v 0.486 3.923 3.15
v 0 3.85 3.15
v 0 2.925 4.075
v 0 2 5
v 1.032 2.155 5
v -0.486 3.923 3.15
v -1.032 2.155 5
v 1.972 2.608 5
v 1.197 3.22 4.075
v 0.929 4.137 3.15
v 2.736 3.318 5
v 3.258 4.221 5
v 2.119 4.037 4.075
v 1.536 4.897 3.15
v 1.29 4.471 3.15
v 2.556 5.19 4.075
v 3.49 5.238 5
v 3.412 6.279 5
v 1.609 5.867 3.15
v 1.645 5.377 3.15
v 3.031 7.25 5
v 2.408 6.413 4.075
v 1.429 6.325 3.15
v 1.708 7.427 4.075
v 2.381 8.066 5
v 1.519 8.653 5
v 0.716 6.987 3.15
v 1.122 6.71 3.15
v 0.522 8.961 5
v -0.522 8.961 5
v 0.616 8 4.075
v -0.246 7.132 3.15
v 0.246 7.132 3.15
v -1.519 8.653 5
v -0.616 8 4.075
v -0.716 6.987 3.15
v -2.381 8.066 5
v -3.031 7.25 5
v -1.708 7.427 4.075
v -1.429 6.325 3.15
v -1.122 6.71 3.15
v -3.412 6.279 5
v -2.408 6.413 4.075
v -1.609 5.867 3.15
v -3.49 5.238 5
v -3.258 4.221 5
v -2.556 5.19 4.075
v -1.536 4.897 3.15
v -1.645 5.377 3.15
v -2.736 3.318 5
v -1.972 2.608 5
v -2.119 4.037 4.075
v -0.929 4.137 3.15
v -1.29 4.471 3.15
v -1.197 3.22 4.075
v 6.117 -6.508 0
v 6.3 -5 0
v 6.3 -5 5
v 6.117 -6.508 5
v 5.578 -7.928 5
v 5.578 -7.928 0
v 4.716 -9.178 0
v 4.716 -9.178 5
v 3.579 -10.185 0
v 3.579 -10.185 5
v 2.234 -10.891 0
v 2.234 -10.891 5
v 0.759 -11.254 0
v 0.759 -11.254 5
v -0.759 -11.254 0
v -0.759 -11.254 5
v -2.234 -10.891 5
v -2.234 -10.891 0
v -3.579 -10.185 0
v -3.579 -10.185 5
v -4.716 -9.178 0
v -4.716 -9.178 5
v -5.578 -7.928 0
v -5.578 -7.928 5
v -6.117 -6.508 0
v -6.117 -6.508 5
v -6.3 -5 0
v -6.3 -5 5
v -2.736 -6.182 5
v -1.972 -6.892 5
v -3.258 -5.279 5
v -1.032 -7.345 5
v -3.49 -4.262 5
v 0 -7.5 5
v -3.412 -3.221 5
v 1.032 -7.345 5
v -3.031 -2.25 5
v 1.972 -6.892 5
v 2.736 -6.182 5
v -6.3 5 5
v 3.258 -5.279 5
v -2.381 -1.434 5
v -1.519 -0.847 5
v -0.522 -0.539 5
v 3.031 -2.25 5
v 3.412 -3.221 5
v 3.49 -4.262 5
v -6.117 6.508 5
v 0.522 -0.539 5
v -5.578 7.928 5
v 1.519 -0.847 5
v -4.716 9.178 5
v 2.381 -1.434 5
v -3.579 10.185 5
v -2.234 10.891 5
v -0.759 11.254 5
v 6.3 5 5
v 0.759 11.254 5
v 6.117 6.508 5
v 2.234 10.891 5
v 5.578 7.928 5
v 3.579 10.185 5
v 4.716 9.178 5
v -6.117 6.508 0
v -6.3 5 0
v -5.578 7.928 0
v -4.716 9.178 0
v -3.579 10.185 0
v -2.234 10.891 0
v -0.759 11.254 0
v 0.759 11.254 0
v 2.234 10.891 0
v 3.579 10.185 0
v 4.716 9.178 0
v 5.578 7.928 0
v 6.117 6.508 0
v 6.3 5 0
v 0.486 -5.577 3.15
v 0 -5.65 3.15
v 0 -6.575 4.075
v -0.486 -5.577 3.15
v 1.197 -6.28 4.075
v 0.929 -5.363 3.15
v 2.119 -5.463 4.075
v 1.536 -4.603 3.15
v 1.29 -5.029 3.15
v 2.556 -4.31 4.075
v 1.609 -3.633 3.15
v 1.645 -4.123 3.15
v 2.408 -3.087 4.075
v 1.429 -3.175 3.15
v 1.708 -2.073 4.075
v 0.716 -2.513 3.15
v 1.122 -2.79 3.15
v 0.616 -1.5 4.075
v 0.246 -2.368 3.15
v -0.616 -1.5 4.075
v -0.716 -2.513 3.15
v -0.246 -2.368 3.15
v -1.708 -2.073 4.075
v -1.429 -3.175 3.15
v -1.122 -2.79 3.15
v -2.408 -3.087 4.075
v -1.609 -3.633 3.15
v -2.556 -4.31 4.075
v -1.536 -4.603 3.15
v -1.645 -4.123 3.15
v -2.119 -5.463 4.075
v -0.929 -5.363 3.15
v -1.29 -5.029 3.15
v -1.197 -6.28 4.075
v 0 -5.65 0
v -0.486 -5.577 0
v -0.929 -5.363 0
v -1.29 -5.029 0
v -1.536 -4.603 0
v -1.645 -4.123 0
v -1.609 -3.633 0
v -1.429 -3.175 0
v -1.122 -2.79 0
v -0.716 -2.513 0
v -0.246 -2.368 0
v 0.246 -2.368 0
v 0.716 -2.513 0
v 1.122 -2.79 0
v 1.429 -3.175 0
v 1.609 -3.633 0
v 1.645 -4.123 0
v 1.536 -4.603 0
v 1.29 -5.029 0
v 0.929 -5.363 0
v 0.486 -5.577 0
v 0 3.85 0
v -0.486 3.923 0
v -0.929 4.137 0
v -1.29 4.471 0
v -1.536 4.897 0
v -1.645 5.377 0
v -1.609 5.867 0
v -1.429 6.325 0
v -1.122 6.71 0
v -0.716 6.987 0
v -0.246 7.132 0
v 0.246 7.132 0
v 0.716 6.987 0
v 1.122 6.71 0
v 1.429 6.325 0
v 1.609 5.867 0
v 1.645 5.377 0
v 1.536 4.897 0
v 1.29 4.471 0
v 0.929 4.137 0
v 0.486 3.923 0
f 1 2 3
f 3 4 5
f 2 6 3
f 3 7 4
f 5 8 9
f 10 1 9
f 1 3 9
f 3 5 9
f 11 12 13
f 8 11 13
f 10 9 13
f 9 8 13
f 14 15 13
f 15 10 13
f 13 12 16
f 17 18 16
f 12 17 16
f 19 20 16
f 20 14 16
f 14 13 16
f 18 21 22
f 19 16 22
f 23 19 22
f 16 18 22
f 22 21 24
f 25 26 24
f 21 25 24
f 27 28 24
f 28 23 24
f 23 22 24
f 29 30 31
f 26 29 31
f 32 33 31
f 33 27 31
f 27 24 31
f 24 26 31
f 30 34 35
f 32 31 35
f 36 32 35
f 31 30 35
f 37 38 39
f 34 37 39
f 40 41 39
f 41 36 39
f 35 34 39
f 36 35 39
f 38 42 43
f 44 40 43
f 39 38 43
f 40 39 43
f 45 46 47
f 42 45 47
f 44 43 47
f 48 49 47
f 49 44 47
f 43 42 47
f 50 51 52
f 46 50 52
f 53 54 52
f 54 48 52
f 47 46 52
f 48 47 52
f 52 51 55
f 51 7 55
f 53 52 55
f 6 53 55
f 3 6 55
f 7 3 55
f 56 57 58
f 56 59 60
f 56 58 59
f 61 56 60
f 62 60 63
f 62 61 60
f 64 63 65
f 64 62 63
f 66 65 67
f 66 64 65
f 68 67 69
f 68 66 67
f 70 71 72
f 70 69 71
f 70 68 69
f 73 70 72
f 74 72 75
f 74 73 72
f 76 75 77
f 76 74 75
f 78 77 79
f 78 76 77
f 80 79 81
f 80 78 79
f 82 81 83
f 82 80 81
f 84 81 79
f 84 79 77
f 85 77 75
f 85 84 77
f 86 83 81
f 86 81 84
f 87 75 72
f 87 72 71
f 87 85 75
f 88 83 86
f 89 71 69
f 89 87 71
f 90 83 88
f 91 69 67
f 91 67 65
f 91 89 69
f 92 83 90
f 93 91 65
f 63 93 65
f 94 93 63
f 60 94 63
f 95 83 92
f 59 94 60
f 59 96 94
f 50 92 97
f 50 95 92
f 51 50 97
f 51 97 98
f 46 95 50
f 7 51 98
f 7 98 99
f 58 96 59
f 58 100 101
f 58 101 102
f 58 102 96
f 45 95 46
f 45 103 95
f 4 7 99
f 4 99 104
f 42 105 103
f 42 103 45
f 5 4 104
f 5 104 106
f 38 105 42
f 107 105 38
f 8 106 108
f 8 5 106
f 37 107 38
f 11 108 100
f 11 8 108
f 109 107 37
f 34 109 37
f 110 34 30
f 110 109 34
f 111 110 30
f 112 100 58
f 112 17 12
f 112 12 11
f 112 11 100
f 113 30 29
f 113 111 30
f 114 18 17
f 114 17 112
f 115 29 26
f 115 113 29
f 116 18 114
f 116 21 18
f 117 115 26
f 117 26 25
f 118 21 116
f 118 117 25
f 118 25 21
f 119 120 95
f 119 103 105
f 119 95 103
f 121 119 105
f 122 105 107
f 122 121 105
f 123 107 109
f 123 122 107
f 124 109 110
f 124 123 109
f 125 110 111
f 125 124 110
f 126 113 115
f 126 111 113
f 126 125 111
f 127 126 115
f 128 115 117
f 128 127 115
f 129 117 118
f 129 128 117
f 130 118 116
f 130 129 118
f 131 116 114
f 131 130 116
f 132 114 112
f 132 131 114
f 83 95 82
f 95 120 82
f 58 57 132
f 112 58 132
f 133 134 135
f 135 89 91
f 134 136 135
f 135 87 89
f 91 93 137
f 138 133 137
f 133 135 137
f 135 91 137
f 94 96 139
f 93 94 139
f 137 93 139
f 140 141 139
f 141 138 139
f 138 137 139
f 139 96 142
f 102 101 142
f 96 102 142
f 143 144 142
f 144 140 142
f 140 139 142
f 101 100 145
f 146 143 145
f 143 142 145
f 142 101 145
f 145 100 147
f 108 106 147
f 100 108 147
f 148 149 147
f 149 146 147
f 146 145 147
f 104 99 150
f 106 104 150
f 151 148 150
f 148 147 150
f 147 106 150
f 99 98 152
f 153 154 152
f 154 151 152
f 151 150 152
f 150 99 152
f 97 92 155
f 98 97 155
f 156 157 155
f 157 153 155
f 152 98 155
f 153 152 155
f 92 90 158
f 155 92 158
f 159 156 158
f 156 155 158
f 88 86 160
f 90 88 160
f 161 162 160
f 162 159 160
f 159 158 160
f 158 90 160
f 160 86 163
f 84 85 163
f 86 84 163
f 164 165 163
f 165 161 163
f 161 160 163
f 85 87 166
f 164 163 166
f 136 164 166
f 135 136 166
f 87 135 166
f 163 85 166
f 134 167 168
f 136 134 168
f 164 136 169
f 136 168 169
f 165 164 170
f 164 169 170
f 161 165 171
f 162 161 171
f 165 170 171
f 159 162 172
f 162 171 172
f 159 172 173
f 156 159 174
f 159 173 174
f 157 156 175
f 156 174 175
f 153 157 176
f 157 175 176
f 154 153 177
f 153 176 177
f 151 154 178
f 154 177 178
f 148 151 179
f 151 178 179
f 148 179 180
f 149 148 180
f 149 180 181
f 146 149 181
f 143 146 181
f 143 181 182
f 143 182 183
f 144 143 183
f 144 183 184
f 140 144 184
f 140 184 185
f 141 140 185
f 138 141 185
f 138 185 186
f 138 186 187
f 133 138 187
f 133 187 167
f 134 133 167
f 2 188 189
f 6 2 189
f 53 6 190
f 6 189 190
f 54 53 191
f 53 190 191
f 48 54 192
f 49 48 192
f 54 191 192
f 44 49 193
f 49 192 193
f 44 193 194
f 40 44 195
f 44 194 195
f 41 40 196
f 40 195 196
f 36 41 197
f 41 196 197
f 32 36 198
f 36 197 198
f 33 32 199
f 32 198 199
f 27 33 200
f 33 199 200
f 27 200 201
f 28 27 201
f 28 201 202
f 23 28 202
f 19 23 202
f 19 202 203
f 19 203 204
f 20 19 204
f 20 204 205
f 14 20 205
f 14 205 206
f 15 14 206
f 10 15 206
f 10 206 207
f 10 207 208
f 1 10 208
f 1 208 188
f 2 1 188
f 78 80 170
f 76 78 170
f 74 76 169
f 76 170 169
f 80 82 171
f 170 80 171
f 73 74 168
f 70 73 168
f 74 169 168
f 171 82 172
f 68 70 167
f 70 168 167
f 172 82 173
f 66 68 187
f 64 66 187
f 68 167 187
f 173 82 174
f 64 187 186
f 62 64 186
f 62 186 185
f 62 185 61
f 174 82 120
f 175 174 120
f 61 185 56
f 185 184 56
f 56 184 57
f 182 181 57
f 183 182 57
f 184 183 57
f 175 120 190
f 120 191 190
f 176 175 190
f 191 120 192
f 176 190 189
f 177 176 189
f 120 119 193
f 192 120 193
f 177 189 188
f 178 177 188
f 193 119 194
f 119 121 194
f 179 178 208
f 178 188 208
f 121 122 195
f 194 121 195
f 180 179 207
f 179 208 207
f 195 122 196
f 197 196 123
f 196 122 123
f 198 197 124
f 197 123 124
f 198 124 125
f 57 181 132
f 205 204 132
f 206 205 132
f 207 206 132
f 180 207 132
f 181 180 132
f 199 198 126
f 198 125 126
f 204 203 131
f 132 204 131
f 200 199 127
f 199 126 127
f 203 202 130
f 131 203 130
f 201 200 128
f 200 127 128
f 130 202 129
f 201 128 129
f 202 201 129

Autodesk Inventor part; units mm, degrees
ref_plane "YZ Plane" through (0, 0, 0) normal (1, 0, 0) x (0, 1, 0)
ref_plane "XZ Plane" through (0, 0, 0) normal (0, 1, 0) x (-1, 0, 0)
ref_plane "XY Plane" through (0, 0, 0) normal (0, 0, 1) x (1, 0, 0)
sketch "Skizze1" plane through (0, 0, 0) normal (0, 0, 1) x (1, 0, 0)
  line L0 (0, -5) -> (0, 5) construction
  line L1 (6.3, -5) -> (6.3, 5)
  line L2 (-6.3, 5) -> (-6.3, -5)
  arc A0 (-6.3, -5) -> (6.3, -5) centre (0, -5) ccw
  arc A1 (6.3, 5) -> (-6.3, 5) centre (0, 5) ccw
  point P0 (0, 0)
  dimension "d0" = 12.6
  dimension "d1" = 10
extrude "Extrusion1" add sketch "Skizze1" along normal blind 5
sketch "Skizze2" plane through (0, 0, 5) normal (0, 0, 1) x (1, 0, 0)
  arc A0 (6.3, 5) -> (-6.3, 5) centre (0, 5) ccw projected
  arc A1 (-6.3, -5) -> (6.3, -5) centre (0, -5) ccw projected
  line L0 (0, 5.5) -> (0, -4) construction
  point P0 (0, 0)
  dimension "d11" = 9.5
  dimension "d13" = 1
hole "Bohrung1" at (0, 5.5, 5) at (0, -4, 5) direction (0, 0, -1) diameter 3.3 end through all countersink diameter 7 countersink angle 90
properties part number "Dribbler Slider" material "Gummi, Silikon"
